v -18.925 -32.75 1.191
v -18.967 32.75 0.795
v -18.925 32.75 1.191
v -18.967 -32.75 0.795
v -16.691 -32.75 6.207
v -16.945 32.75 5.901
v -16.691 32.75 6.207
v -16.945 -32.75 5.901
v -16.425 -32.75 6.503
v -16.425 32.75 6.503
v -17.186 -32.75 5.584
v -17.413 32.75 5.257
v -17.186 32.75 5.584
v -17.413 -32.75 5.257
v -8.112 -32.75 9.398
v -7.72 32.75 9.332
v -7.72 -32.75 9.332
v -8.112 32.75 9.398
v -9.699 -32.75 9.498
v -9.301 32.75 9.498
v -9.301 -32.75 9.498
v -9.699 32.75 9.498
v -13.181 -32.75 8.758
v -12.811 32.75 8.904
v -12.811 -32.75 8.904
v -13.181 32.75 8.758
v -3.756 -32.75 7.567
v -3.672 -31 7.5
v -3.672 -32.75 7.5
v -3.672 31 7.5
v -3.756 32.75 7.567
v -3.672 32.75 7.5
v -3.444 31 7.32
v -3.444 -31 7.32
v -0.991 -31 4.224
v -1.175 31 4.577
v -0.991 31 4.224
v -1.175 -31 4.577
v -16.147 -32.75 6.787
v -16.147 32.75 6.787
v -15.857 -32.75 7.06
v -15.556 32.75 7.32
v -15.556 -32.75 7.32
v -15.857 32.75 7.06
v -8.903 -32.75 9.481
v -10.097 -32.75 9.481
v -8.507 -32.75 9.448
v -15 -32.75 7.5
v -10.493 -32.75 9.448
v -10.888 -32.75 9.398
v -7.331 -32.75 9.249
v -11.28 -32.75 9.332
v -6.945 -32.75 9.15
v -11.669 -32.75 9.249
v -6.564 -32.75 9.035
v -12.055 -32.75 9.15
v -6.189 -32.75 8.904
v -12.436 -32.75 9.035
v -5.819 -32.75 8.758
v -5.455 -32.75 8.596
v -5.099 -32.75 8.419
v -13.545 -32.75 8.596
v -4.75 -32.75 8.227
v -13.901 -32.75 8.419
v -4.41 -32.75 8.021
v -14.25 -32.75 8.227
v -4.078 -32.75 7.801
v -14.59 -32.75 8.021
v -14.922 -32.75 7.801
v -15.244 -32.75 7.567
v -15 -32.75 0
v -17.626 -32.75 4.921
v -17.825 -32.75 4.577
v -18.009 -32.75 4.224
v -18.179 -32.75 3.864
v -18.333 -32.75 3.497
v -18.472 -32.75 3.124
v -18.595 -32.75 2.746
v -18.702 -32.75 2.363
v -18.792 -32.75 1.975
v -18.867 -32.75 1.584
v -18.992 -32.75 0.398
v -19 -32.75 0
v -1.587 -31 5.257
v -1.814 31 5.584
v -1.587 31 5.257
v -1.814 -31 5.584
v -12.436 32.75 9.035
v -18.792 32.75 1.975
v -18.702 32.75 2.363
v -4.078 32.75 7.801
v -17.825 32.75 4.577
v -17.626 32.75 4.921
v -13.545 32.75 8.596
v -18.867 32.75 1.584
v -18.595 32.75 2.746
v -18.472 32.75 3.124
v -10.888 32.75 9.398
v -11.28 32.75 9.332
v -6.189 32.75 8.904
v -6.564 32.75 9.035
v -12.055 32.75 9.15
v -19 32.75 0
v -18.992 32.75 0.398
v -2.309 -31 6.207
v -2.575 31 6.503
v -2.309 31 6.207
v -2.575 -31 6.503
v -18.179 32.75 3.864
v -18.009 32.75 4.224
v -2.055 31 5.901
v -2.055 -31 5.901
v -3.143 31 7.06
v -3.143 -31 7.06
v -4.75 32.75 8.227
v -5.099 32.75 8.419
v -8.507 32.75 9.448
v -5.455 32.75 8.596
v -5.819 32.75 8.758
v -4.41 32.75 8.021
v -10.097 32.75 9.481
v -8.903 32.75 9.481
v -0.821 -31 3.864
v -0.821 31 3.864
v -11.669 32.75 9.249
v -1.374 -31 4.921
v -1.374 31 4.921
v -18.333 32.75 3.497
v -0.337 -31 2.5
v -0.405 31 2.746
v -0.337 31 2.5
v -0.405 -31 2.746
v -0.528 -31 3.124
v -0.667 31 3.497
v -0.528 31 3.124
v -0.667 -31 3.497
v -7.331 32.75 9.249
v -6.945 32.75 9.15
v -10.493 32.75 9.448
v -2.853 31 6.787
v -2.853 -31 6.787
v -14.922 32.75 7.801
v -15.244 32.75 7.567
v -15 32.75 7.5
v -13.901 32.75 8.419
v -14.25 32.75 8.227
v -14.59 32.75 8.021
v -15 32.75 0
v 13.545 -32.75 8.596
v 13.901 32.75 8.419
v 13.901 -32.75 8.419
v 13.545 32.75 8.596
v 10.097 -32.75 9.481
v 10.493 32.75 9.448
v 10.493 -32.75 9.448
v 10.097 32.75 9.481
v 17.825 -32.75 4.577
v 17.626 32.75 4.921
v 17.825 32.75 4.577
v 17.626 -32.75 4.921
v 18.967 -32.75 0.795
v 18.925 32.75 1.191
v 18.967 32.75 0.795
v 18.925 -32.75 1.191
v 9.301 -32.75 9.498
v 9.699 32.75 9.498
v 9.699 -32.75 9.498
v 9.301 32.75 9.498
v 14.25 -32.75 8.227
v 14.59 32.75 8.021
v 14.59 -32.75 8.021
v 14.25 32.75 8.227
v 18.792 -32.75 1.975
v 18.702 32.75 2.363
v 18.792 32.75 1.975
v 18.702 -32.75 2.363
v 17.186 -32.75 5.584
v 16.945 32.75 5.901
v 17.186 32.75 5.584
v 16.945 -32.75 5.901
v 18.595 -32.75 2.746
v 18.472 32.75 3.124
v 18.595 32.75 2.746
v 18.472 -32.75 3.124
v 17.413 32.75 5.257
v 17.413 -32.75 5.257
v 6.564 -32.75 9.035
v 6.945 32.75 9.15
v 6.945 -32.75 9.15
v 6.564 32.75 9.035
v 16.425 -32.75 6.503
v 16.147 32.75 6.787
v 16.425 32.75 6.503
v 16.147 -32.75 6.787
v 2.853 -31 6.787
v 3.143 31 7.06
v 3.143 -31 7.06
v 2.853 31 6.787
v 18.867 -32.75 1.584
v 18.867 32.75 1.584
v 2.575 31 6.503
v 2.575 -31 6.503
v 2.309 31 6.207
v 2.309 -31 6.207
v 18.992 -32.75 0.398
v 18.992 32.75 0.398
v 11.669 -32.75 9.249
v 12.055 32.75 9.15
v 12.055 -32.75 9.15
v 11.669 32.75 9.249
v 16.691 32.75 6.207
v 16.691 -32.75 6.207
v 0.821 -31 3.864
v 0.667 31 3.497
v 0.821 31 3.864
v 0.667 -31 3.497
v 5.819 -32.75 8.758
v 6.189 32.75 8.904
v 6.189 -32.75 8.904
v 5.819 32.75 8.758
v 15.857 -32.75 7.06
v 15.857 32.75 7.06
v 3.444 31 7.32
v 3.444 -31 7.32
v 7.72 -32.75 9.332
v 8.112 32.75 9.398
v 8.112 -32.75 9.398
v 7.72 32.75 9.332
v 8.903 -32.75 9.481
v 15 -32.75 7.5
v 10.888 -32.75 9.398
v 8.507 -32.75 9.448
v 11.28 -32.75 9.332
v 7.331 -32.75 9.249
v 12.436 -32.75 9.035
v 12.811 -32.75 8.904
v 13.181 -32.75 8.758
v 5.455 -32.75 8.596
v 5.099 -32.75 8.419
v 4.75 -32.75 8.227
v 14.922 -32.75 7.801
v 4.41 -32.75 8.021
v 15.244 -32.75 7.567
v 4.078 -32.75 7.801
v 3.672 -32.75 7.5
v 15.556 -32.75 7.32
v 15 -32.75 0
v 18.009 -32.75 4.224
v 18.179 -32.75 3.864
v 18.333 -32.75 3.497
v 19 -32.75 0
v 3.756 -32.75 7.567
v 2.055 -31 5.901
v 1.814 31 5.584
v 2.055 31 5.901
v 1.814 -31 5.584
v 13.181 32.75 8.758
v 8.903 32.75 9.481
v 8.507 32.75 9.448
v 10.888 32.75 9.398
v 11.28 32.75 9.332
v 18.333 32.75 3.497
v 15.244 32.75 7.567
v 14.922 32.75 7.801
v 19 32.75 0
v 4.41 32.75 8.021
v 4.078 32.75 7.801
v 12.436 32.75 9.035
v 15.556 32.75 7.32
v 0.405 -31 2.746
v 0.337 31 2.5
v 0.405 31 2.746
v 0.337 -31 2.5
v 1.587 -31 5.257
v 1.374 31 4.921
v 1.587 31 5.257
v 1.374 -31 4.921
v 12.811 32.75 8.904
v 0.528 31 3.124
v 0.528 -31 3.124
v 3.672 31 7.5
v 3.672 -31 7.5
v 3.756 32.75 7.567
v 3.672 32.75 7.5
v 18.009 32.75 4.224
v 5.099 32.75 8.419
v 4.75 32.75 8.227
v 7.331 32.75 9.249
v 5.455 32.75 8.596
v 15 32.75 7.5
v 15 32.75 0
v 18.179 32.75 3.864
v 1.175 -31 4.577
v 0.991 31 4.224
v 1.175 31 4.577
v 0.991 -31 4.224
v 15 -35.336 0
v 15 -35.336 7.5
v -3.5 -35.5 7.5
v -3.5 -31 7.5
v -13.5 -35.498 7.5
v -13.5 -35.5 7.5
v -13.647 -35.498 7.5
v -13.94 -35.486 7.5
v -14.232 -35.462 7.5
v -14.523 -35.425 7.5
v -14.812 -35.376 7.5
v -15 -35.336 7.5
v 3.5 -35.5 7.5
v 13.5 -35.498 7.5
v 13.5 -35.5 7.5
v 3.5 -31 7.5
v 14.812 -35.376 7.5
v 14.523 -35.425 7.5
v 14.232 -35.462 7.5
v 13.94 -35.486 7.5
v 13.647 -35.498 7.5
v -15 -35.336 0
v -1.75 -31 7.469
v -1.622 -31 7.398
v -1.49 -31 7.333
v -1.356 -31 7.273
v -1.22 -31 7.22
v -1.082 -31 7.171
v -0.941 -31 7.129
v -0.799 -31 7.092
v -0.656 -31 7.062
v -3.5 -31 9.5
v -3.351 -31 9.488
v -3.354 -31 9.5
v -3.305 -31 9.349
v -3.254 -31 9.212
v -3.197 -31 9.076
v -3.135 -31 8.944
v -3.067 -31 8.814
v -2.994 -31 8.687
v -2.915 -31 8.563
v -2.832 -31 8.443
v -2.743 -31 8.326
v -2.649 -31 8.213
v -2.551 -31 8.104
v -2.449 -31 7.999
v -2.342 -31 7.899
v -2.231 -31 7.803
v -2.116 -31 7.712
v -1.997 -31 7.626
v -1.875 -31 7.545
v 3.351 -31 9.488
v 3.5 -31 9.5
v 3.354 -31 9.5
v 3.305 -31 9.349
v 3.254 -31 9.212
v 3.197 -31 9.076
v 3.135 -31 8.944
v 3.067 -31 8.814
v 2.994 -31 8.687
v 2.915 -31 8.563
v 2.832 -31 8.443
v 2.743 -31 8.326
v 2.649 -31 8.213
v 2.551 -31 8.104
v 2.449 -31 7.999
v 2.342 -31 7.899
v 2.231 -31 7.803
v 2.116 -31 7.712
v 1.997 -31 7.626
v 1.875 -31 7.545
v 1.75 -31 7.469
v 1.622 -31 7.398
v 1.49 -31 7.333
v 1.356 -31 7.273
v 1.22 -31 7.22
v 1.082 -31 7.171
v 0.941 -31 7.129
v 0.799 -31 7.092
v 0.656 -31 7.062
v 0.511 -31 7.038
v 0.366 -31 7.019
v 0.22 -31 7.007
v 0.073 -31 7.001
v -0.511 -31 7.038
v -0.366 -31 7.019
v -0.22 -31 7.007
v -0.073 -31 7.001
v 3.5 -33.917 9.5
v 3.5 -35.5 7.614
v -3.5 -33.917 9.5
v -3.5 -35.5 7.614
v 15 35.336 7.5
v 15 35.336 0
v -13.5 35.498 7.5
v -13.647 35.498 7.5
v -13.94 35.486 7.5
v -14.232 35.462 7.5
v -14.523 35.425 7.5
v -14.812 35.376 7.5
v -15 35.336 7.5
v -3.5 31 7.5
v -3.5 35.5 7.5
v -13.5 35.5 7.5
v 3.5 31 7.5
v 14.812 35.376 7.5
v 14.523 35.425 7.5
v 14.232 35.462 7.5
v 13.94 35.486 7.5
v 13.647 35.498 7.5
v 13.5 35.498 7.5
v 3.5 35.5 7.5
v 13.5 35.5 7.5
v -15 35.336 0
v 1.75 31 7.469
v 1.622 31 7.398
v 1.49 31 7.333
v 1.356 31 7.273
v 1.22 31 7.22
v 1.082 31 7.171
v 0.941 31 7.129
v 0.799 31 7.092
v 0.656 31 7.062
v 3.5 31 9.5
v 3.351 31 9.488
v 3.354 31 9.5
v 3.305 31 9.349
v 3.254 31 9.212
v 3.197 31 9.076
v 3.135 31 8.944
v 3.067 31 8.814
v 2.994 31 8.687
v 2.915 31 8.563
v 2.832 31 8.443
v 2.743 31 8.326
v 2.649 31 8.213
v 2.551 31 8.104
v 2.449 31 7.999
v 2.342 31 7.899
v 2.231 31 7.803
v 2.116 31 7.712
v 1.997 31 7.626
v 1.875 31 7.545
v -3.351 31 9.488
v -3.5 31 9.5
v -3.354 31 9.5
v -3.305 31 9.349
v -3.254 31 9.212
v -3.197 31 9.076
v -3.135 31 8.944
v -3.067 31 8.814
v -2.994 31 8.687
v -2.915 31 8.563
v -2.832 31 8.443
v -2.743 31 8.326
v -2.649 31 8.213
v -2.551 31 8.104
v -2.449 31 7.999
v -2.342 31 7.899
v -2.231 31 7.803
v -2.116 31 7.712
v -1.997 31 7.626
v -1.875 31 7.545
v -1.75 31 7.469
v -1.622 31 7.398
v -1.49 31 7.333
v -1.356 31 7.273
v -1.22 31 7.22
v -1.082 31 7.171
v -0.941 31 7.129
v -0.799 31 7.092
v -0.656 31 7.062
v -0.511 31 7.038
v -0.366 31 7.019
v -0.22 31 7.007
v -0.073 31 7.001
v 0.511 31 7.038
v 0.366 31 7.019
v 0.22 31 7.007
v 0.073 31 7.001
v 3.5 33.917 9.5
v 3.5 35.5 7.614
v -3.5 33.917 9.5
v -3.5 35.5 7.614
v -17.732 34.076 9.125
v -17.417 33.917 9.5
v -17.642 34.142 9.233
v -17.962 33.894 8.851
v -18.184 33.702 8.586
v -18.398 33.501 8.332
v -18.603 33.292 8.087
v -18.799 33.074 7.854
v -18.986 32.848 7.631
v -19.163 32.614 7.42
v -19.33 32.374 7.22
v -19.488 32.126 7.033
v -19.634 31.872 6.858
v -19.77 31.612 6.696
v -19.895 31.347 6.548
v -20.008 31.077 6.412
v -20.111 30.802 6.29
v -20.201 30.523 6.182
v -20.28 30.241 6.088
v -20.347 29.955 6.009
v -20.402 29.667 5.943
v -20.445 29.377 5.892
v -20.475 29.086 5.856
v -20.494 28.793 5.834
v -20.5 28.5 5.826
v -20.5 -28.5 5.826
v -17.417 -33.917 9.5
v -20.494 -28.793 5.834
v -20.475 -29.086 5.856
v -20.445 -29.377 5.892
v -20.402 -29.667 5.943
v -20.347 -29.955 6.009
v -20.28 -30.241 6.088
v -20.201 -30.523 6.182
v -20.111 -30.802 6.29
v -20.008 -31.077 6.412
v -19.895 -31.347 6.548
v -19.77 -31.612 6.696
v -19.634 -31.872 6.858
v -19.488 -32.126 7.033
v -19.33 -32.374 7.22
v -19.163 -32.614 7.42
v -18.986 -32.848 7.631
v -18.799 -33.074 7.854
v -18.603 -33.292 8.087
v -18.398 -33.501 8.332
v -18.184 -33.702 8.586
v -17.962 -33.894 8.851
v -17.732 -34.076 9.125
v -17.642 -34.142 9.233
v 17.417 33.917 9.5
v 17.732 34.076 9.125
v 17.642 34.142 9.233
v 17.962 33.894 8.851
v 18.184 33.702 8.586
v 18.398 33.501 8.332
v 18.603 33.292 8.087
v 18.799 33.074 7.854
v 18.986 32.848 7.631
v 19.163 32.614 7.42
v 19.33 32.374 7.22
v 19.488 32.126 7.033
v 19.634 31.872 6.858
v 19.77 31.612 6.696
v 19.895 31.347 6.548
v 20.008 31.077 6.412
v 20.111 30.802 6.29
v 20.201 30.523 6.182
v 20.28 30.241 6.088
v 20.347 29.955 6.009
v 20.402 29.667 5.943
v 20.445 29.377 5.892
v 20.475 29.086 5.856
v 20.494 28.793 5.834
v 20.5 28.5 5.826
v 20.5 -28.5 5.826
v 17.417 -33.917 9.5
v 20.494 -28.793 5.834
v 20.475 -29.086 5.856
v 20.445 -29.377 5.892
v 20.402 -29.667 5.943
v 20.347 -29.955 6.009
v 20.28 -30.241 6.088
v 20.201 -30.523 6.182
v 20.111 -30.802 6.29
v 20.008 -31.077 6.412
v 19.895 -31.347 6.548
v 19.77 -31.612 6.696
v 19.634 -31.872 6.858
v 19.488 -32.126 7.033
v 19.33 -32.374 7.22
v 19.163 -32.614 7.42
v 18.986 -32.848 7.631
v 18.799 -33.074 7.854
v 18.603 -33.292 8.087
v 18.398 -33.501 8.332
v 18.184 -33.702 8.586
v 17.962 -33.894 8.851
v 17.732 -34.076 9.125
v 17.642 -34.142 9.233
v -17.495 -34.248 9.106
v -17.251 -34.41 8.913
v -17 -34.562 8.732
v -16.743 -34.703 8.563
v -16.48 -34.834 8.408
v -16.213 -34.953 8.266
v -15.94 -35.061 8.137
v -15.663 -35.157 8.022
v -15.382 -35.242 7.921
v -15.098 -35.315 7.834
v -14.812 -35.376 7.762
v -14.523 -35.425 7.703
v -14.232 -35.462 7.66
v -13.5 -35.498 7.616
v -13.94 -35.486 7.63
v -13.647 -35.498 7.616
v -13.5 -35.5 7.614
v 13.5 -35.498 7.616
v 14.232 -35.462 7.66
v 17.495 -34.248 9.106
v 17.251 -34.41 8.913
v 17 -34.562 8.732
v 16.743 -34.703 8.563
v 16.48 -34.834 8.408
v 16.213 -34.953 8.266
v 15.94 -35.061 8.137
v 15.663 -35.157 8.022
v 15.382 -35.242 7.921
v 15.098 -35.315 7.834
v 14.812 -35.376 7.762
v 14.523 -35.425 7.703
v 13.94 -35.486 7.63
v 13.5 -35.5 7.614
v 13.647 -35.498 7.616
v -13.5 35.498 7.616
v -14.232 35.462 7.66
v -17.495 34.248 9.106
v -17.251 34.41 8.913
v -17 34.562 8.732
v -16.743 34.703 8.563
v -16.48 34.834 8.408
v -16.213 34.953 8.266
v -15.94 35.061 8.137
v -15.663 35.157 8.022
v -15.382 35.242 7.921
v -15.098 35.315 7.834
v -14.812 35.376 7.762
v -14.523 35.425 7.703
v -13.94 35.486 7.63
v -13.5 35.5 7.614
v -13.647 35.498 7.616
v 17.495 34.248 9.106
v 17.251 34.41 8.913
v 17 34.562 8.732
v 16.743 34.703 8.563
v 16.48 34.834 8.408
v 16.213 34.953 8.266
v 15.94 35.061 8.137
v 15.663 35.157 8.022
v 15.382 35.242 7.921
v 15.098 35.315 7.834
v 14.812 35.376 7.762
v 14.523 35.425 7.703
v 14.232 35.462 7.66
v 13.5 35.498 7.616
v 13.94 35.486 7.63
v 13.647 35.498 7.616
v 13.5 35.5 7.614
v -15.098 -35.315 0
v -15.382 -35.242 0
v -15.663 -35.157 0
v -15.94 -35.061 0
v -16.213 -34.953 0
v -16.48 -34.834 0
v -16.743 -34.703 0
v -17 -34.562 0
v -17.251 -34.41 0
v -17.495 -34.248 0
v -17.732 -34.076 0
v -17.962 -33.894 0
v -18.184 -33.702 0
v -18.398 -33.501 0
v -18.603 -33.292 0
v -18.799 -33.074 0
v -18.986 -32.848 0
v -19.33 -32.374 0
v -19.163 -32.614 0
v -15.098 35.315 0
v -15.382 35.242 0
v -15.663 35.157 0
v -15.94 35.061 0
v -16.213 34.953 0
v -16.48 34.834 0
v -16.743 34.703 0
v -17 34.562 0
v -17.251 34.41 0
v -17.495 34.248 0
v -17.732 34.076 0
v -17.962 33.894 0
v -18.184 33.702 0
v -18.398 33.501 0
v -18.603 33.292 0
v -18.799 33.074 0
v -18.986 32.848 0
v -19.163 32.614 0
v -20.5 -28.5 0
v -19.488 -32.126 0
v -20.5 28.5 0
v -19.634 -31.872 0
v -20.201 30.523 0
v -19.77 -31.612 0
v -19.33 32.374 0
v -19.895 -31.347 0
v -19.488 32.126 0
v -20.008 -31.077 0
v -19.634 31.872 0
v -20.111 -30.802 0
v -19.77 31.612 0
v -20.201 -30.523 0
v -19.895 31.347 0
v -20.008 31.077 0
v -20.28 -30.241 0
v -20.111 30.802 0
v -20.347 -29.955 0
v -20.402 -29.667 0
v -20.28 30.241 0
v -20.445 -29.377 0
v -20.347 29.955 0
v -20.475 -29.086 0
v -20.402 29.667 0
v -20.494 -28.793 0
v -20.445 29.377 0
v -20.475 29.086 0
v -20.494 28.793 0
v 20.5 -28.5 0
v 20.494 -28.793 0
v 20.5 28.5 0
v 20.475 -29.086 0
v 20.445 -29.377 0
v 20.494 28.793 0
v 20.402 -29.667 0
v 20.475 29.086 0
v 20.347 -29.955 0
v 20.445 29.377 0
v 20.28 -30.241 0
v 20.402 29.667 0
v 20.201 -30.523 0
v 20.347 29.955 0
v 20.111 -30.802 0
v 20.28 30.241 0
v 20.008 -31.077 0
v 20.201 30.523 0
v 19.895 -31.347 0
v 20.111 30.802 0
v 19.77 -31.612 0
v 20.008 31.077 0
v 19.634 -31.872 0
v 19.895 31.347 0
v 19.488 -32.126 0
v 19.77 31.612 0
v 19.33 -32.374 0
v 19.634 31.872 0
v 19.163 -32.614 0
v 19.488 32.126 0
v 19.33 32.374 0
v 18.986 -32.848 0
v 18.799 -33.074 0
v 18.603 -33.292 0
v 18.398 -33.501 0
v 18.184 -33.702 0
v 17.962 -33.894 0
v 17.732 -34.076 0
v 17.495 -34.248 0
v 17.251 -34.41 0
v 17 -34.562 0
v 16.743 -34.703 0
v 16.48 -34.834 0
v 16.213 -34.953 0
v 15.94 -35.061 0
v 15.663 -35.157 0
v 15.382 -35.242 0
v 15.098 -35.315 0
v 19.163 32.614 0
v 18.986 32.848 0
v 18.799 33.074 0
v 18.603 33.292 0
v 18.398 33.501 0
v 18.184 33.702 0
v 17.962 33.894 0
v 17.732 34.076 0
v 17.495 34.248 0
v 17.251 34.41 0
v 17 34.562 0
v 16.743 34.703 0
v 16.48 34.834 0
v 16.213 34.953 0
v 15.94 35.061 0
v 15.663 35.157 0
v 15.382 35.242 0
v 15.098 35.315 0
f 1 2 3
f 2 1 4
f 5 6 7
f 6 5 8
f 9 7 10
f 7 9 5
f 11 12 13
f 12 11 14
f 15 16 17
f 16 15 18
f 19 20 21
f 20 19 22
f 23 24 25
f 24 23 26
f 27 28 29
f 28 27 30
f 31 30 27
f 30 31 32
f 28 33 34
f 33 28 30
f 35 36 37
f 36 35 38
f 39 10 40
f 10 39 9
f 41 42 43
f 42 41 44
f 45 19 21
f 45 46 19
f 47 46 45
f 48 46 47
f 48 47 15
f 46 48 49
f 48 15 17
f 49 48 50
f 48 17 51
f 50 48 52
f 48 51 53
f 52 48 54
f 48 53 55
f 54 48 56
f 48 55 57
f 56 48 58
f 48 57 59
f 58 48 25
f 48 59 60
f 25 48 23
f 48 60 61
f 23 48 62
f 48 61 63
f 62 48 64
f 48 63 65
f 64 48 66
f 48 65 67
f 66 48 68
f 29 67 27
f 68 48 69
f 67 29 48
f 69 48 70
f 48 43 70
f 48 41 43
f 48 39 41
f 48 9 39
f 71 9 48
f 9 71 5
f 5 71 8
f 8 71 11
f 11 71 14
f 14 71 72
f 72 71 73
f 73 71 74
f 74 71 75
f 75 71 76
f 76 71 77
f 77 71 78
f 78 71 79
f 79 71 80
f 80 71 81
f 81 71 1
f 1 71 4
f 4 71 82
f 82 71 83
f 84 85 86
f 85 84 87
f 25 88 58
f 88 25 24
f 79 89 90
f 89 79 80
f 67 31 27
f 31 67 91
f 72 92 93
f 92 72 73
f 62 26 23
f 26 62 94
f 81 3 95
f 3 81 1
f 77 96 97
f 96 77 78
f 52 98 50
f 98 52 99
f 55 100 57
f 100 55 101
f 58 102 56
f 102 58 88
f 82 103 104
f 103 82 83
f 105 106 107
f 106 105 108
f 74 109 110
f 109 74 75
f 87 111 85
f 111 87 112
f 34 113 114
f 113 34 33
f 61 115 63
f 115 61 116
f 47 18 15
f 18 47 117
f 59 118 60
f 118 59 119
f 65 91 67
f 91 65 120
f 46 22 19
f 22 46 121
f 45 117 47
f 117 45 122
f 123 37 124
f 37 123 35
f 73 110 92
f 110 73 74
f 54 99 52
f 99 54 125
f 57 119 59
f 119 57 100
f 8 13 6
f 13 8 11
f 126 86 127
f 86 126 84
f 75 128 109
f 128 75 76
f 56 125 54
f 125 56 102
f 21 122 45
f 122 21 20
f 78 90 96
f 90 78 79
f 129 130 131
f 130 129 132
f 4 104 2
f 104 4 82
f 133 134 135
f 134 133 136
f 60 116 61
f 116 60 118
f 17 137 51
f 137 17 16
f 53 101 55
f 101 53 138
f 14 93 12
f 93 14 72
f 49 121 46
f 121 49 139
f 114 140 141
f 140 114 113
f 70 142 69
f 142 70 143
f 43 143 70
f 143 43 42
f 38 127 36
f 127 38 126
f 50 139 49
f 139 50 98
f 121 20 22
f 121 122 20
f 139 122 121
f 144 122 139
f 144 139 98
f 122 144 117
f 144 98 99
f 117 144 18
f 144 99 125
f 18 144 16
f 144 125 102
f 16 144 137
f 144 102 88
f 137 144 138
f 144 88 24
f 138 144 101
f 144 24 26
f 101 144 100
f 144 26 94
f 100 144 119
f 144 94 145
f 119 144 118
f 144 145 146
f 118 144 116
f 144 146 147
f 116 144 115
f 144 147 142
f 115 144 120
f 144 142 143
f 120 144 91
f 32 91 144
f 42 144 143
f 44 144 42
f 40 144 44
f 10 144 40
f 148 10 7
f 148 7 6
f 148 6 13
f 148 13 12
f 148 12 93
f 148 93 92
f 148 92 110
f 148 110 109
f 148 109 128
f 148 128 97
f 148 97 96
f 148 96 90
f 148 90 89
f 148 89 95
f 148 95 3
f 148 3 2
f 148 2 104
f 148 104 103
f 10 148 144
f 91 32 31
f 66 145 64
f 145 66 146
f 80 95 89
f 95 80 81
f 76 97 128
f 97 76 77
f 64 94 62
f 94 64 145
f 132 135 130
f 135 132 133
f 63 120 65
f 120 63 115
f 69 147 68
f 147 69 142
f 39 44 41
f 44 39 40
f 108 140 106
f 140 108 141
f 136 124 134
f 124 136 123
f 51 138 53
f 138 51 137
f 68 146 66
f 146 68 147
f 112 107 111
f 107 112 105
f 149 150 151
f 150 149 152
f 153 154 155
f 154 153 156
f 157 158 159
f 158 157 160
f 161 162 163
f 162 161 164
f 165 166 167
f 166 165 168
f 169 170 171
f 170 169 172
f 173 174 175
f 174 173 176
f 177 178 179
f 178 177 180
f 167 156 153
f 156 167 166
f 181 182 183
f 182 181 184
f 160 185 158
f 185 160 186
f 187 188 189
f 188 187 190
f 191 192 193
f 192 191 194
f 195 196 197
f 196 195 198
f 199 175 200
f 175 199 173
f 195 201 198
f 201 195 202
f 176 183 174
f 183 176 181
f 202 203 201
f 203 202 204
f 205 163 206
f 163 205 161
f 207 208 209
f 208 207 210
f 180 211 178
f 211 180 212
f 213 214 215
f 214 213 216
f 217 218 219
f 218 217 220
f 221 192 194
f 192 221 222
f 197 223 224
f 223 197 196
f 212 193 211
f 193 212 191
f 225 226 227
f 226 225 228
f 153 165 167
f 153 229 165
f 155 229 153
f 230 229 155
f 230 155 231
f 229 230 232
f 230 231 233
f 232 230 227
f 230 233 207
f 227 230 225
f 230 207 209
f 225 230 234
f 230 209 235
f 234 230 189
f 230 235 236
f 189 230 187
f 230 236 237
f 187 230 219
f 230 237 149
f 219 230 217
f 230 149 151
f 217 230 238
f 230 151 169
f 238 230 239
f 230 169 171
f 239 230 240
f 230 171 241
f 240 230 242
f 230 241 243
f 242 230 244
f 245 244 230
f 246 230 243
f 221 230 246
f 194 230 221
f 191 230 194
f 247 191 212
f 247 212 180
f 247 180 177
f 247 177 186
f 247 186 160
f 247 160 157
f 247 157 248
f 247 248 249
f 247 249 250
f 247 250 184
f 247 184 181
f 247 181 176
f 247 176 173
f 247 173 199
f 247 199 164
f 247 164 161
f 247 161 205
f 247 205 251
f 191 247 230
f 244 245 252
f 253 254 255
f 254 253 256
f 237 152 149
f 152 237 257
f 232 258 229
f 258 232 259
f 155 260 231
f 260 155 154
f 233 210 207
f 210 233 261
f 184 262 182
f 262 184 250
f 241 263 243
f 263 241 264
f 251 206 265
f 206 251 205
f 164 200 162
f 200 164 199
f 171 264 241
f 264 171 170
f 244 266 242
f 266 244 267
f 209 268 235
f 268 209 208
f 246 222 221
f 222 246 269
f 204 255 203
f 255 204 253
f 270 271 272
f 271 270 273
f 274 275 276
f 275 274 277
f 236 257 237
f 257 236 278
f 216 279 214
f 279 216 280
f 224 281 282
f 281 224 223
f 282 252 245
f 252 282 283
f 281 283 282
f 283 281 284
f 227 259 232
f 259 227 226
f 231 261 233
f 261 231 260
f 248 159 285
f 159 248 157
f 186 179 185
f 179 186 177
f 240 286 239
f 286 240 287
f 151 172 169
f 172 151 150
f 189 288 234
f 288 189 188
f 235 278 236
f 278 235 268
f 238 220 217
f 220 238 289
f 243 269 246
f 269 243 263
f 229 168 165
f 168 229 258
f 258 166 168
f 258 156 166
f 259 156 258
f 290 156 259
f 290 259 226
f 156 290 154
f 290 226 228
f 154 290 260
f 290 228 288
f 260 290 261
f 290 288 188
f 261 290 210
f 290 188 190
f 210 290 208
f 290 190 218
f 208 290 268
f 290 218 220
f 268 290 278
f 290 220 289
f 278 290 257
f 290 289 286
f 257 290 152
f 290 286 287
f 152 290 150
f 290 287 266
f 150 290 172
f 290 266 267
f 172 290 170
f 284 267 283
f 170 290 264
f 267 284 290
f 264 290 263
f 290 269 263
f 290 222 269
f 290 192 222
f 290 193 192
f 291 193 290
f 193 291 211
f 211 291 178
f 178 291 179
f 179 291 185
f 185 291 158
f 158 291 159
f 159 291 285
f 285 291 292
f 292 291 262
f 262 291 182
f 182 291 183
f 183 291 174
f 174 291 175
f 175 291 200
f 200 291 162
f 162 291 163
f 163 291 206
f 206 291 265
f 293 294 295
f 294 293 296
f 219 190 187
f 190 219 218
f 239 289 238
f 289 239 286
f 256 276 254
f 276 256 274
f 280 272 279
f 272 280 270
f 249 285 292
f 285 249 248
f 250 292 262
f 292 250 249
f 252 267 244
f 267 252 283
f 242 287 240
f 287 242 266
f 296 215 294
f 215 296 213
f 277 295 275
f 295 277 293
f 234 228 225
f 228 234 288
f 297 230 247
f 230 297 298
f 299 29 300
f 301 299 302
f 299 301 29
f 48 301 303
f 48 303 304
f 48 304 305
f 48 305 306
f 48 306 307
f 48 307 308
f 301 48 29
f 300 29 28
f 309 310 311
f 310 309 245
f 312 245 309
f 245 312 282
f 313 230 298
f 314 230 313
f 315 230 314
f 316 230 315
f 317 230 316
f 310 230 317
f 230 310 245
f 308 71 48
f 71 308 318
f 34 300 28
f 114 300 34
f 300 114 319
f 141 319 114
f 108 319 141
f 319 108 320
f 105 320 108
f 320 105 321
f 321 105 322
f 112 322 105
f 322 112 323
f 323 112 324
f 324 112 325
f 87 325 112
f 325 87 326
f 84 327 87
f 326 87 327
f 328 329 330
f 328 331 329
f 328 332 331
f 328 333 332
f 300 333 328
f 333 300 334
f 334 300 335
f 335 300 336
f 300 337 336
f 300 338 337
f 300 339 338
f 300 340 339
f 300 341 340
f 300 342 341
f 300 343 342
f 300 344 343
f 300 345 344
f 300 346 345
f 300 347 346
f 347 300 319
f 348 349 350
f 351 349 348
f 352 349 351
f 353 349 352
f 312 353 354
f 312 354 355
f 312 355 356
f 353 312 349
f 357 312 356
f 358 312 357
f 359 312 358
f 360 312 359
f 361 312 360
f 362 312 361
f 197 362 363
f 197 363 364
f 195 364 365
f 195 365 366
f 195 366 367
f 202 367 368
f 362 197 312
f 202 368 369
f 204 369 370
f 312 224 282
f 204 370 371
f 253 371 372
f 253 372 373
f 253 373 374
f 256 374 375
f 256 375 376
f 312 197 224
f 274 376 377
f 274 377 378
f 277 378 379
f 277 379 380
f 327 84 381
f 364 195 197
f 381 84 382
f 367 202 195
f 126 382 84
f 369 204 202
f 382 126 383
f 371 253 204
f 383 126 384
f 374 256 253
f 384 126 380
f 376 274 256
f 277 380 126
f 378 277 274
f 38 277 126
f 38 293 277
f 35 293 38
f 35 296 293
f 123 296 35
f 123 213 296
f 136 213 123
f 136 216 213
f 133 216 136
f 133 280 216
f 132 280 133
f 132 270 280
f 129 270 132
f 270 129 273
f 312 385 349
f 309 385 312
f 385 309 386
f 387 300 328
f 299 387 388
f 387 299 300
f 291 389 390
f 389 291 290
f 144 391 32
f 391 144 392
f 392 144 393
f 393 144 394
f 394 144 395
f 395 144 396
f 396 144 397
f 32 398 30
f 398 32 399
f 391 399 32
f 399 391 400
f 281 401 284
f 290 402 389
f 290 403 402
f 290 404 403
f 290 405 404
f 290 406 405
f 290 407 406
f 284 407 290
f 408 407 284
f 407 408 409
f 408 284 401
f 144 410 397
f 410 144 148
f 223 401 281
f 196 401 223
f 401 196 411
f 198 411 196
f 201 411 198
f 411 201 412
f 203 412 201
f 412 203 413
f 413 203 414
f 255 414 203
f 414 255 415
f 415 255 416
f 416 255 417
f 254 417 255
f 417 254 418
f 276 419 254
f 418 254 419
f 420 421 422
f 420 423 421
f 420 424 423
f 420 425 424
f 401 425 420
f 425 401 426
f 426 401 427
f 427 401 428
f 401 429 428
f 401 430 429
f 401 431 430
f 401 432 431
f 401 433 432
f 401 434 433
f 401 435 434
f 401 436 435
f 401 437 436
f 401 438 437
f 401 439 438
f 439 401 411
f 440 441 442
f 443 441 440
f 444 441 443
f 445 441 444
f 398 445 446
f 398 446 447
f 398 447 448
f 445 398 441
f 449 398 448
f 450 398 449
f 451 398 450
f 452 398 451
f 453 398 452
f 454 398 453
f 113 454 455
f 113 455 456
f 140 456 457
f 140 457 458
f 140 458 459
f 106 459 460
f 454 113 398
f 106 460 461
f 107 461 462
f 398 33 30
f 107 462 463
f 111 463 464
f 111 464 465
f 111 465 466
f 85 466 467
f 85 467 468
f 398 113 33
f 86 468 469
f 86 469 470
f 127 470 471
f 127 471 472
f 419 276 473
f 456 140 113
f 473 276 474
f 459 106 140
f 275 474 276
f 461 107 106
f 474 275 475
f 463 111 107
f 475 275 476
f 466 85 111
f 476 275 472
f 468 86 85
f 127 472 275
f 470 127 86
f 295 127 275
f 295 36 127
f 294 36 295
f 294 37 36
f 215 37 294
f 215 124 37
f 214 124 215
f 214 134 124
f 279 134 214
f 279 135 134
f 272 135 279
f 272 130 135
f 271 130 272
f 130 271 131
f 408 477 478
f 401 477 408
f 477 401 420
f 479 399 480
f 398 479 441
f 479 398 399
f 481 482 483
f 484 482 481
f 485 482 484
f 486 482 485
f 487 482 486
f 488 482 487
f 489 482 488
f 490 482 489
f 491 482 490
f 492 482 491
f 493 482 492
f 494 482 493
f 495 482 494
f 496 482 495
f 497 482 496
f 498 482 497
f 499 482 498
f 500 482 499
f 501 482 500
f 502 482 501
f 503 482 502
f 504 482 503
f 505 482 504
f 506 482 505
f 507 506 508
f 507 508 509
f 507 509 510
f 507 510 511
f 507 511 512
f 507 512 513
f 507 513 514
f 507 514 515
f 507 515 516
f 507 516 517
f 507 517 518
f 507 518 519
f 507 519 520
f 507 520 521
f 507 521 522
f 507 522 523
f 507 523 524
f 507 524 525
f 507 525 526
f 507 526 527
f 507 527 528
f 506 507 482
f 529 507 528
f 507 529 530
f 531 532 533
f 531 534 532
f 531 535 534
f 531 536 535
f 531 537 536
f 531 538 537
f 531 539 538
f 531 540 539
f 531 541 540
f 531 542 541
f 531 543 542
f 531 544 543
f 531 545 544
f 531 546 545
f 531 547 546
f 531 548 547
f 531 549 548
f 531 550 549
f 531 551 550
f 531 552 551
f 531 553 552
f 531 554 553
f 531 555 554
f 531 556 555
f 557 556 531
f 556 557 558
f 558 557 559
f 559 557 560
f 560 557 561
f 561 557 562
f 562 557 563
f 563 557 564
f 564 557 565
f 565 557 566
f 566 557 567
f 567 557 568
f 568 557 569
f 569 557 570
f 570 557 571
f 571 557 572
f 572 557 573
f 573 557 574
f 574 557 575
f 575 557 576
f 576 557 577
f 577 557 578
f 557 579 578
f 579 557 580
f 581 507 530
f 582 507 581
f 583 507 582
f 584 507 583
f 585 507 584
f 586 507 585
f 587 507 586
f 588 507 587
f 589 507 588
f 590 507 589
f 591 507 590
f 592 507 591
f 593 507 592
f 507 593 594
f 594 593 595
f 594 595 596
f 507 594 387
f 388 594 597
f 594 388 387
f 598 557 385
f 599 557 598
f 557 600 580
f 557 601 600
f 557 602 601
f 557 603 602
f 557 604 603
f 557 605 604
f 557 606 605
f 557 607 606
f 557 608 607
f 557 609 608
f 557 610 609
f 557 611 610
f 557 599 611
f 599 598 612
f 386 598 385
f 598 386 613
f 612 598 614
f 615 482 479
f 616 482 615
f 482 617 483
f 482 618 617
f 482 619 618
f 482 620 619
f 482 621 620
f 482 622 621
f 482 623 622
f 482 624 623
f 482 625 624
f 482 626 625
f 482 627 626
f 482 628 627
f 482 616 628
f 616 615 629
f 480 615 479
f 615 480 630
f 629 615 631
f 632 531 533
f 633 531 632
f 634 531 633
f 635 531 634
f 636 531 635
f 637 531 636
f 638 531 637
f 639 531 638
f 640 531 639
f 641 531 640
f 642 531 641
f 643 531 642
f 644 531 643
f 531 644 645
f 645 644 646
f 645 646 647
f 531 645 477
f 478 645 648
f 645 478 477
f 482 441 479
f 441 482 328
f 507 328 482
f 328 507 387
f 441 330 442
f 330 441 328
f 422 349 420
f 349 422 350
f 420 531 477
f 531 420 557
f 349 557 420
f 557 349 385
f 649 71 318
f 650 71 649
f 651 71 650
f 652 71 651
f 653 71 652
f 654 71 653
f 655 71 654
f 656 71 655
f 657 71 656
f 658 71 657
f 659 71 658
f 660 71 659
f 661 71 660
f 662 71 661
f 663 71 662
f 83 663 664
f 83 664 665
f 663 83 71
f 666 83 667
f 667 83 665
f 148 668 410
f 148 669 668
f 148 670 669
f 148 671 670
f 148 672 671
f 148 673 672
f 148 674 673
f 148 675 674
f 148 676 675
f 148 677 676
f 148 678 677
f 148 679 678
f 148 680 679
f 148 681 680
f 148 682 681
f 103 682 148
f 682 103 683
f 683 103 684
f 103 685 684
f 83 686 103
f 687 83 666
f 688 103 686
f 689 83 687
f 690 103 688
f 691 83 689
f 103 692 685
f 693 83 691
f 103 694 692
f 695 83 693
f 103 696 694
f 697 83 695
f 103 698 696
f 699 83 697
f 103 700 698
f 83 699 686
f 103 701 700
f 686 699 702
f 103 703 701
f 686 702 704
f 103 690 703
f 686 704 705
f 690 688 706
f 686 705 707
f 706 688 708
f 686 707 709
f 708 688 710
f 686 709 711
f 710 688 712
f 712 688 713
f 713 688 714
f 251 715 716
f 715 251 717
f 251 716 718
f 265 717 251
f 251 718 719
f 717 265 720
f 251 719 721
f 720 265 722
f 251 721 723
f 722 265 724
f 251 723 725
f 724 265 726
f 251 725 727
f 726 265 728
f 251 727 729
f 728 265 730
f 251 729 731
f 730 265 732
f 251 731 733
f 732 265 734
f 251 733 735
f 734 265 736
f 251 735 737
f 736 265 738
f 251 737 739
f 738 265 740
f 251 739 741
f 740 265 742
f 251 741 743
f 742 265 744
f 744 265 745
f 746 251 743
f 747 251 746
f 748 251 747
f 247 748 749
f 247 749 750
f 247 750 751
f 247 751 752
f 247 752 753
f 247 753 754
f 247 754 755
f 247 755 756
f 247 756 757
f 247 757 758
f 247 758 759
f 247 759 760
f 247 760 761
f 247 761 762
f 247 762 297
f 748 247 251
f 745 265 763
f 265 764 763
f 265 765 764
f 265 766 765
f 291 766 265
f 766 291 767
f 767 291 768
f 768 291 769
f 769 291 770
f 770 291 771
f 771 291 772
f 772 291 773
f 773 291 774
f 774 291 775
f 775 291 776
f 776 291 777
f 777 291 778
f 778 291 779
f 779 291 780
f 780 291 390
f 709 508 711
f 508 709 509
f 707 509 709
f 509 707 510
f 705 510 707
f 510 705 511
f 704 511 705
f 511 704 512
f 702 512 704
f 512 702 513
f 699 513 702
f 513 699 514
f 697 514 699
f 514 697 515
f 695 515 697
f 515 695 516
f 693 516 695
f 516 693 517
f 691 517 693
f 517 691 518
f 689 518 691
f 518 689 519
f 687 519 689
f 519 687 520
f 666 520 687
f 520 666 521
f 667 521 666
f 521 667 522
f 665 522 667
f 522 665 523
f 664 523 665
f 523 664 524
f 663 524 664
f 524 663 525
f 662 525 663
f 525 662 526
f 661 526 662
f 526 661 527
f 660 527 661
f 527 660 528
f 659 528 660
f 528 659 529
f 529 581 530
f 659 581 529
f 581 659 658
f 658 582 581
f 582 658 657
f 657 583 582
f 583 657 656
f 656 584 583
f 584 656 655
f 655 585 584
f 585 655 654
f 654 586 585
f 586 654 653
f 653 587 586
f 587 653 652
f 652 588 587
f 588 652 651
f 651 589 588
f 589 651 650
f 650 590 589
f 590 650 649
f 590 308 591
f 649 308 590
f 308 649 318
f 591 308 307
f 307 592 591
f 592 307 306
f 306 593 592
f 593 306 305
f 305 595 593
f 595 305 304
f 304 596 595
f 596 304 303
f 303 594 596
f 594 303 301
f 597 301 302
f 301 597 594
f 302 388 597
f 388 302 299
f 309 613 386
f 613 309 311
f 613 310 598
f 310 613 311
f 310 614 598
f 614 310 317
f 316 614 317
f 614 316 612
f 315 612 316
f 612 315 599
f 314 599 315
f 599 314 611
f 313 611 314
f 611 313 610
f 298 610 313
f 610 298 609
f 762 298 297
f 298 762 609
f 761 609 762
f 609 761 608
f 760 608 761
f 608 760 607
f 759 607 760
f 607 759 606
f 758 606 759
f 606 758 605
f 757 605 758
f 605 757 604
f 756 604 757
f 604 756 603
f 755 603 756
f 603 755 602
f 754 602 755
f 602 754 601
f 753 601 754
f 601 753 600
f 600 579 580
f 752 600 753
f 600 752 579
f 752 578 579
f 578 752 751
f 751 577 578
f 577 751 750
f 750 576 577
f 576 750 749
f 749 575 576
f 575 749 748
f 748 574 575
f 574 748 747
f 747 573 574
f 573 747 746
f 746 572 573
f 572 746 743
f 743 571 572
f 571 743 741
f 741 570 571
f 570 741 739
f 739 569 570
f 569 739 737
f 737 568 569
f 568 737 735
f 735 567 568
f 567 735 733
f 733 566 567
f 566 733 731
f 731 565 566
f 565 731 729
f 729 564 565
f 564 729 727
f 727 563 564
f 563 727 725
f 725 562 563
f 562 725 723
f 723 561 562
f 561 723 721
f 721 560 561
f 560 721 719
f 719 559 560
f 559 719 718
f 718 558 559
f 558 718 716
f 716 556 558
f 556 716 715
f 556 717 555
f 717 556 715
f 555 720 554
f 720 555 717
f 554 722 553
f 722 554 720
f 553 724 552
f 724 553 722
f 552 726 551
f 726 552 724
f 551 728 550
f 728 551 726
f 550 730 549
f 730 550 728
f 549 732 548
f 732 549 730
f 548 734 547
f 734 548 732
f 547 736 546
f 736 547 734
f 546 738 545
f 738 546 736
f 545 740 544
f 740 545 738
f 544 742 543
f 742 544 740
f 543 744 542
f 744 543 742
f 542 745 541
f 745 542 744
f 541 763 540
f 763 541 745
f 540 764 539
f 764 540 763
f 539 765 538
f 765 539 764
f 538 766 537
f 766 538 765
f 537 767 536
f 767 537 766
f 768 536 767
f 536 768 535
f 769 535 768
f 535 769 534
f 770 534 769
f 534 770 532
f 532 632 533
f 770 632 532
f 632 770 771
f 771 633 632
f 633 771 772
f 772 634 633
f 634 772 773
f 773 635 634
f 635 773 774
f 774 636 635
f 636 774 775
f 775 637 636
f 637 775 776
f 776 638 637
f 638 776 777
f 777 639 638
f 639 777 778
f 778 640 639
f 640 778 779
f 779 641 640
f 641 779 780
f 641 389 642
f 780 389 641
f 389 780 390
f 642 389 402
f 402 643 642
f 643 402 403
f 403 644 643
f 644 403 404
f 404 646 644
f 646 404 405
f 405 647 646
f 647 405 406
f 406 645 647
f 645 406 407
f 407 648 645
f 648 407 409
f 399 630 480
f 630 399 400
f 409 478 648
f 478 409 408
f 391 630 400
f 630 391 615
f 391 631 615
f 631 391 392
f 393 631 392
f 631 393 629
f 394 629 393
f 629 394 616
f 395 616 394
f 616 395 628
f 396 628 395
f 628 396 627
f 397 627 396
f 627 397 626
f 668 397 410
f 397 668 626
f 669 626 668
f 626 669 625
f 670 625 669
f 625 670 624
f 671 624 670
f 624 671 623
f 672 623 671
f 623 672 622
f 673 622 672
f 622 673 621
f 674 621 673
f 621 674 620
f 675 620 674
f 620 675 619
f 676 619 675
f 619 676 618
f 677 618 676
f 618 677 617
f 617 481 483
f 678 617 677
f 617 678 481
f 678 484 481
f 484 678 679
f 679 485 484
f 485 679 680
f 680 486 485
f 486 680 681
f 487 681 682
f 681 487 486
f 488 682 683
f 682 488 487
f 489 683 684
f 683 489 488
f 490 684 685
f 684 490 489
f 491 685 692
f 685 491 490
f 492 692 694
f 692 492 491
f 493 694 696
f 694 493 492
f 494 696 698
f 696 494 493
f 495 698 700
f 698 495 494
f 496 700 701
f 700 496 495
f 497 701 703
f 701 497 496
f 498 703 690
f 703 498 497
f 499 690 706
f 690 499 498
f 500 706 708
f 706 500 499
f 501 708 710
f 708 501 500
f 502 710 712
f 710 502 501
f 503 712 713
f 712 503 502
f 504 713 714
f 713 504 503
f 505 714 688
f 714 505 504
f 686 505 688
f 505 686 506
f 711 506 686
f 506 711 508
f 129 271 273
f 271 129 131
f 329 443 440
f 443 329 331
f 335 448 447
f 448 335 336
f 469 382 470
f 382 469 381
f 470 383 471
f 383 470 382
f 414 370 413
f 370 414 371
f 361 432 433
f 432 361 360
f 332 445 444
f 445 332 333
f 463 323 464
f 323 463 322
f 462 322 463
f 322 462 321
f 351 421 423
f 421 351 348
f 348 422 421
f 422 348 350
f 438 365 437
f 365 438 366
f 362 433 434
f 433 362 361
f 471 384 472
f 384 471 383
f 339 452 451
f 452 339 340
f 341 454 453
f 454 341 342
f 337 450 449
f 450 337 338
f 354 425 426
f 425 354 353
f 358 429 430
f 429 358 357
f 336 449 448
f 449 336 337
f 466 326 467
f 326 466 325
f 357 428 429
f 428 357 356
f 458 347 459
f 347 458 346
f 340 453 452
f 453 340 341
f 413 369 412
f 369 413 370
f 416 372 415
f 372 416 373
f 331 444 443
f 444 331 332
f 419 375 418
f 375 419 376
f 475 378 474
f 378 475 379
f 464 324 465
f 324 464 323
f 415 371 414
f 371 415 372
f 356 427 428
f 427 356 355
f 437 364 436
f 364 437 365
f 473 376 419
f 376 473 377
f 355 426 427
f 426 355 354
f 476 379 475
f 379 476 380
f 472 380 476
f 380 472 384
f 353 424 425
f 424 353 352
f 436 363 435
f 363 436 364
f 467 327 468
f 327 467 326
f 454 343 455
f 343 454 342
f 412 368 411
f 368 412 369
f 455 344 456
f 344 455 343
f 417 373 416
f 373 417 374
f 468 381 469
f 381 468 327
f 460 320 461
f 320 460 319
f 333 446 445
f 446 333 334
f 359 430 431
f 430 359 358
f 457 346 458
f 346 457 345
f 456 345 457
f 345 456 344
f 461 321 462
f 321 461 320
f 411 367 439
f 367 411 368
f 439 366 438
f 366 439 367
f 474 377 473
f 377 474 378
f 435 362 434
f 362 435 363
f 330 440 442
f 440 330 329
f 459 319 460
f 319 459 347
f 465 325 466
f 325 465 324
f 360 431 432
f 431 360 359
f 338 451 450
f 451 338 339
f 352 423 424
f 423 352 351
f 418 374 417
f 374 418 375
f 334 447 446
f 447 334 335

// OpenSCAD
// file: ../roundedcube.scad
// Higher definition curves
$fs = 0.01;

module roundedcube(size = [1, 1, 1], center = false, radius = 0.5, apply_to = "all") {
	// If single value, convert to [x, y, z] vector
	size = (size[0] == undef) ? [size, size, size] : size;

	translate_min = radius;
	translate_xmax = size[0] - radius;
	translate_ymax = size[1] - radius;
	translate_zmax = size[2] - radius;

	diameter = radius * 2;

	module build_point(type = "sphere", rotate = [0, 0, 0]) {
		if (type == "sphere") {
			sphere(r = radius);
		} else if (type == "cylinder") {
			rotate(a = rotate)
			cylinder(h = diameter, r = radius, center = true);
		}
	}

	obj_translate = (center == false) ?
		[0, 0, 0] : [
			-(size[0] / 2),
			-(size[1] / 2),
			-(size[2] / 2)
		];

	translate(v = obj_translate) {
		hull() {
			for (translate_x = [translate_min, translate_xmax]) {
				x_at = (translate_x == translate_min) ? "min" : "max";
				for (translate_y = [translate_min, translate_ymax]) {
					y_at = (translate_y == translate_min) ? "min" : "max";
					for (translate_z = [translate_min, translate_zmax]) {
						z_at = (translate_z == translate_min) ? "min" : "max";

						translate(v = [translate_x, translate_y, translate_z])
						if (
							(apply_to == "all") ||
							(apply_to == "xmin" && x_at == "min") || (apply_to == "xmax" && x_at == "max") ||
							(apply_to == "ymin" && y_at == "min") || (apply_to == "ymax" && y_at == "max") ||
							(apply_to == "zmin" && z_at == "min") || (apply_to == "zmax" && z_at == "max")
						) {
							build_point("sphere");
						} else {
							rotate =
								(apply_to == "xmin" || apply_to == "xmax" || apply_to == "x") ? [0, 90, 0] : (
								(apply_to == "ymin" || apply_to == "ymax" || apply_to == "y") ? [90, 90, 0] :
								[0, 0, 0]
							);
							build_point("cylinder", rotate);
						}
					}
				}
			}
		}
	}
}

module roundedcubez(size = [1, 1, 1], center = false, radius = 0.5, apply_to = "all") {
	intersection() {
		roundedcube(size, center, radius, apply_to="z");
		scale([1.0, 1.0, 1.1])
			cube(size, center);
	}
}

// The good stuff!!!!  Forget about the whack stuff above.
// centered on XY only
module cube_(size=[1, 1, 1])
	translate([-size[0] / 2, -size[1] / 2, 0])
		cube(size);

// centered on XY only
module roundedcubez_(size = [1, 1, 1], radius = 0.5) {
	linear_extrude(height=size[2]) {
		square([size[0] - 2 * radius, size[1]], center=true);
		square([size[0], size[1] - 2 * radius], center=true);
		for (i=[-1, 1])
			for (j=[-1, 1])
				translate([i * (size[0] / 2 - radius), j * (size[1] / 2 - radius), 0])
					circle(r = radius);
	}
}
// main file
$fn = $preview ? 30 : 150;

include <../roundedcube.scad>

h_batt = 9.5;

module batt(d=18.5) {
	rotate([90, 0, 0])
		for (i=[-1, 1])
			translate([9.5 * i, 0, 0])
				cylinder(h=65.5, d=d, center=true);
}

module batt_plate(with_channel=false) {
	difference() {
		translate([0, 0, -h_batt])
			roundedcubez_([41, 71, h_batt], 7);
			batt(19);
			// cut sharp peak between the batts
			cube(size=[5, 100, 5], center=true);
			// cable channel
			if (with_channel)
				translate([0, 0, -10.5])
					rotate([90, 0, 0])
						cylinder(h=75, d=7, center=true);
			for (i=[-1, 1]) {
				//  cut-out for nickel strips
				translate([0, i * 36, 0])
					cube(size=[30, 10, 15], center=true);
				// cable holes
				if (with_channel)
					translate([0, i * 35, -15])
						cube_([7, 8, 20]);
			}

			if (with_channel)
				translate([0, 0, -19])
					top_plate_chamfer(50, x=45, y=78);
	}
}

module board(){
	difference() {
		translate([0, -28 / 2, 0])
			cube(size=[33, 28, 3]);
		// Right long hole
		translate([32, 0, 0])
			cylinder(h=10, d=2.6, center=true);
		translate([32 + 2.6 / 2, 0, 0])
			cube([2.6, 2.6, 10], center=true);
		for (i=[-1, 1]) {
			// Top bottom hole
			translate([12, i * 28 / 2, 0])
				cylinder(h=10, d=2.6, center=true);
			// Poewr hole
			translate([32.2 - 1, i * 5, 0])
				cylinder(h=10, d=1.6, center=true);
		}
	}
	// USB
	color("blue")
		translate([-1, -9 / 2, 3])
			cube(size=[7.5, 9, 5 - 3]);
	// Btn
	color("white")
		translate([2.25, -14.5, 3])
			cube(size=[7, 2.5, 5.25 -3]);
	// L
	color("black")
		translate([17, -14, 3])
			cube(size=[10.5, 10.5, 5.5 -3]);
}

module board_stamp(){
	translate([0, 19, 0])
		cube_(size=[29, 33.5, 3.5]);

	translate([0, 1.5, 0])
		cube_(size=[20, 10, 4]);
	// USB
	translate([0, 32.7, -0.1])
		cube_([10, 9, 10]);
	// L
	translate([-8.7, 13.2, -0.1])
		cube_([12, 12, 10]);
	// Switch
	translate([-13.75, 29.8, 1.5])
		cube_([5, 8.5, 5]);
	// Switch hole
	translate([-25, 29.8, 4])
		rotate([0, 90, 0])
			cylinder(d=3, h=10);
	// LEDs
	translate([12.5, 30.5, -0.1])
		cube_([4, 10.5, 10]);
}

module top_plate_chamfer(angle=30, x=41, y=71) {
	for (i=[-1, 1])
		translate([i * x / 2, 0, 0])
			rotate([0, -i * angle, 0])
				cube(size=[20, 100, 20], center=true);

	for (j=[-1, 1])
		translate([0, j * y / 2, 0])
			rotate([j * angle, 0, 0])
				cube(size=[100, 20, 20], center=true);
}

module top_plate_b() {
	difference() {
		roundedcubez_([41, 71, 5.5], 7);
		translate([0, 0, -0.1])
			board_stamp();

		translate([0, 0, -9])
			top_plate_chamfer(40);

		// cable channel
		translate([0, 0, -0.1])
			cube_([6.4, 100, 3.5]);
	}
	// Pins
	translate([0, 3.3, 0])
		cylinder(h=5.5, d=2.3);
	for (i=[-1, 1])
		translate([i * 28.5 / 2, 23.5, 0])
			cylinder(h=5.5, d=2.3);
}

// top_plate_b();

module shell() {
	h = 22;
	thck = 3;
	translate([0, 0, -h/2])
		difference() {
			roundedcubez_([42 + thck, 72 + thck, h + 4], 7);
			translate([0, 0, -1])
				roundedcubez_([42, 72, h + 10], 7);
			// Hole for USB-C
			translate([0, 41, 23.5])
				rotate([90, 0, 0])
					roundedcubez_(size=[10, 3, 10], radius=1);
			// Button
			translate([-25, 29.8, 23.65])
				rotate([0, 90, 0])
					cylinder(h=10, d=3);
		}
}

module pin() {
	cylinder(d=2.5, h=7.5);
	cylinder(d=3.5, h=1);
}

module all() {
	// batt();
	// batt_plate();
	mirror([0, 0, 1])
		batt_plate(true);

	// translate([0, 0, h_batt])
	// 	top_plate_b();

	// translate([0, 35.5, 9.4])
	// 	rotate([0, 0, -90])
	// 		board();

	// translate([0, 0, 0.75])
	// 	shell();
}

intersection() {
	all();
	// translate([83, 0, 0])
	// 	cube(size=[200, 200, 200], center=true);
}

// pin();
